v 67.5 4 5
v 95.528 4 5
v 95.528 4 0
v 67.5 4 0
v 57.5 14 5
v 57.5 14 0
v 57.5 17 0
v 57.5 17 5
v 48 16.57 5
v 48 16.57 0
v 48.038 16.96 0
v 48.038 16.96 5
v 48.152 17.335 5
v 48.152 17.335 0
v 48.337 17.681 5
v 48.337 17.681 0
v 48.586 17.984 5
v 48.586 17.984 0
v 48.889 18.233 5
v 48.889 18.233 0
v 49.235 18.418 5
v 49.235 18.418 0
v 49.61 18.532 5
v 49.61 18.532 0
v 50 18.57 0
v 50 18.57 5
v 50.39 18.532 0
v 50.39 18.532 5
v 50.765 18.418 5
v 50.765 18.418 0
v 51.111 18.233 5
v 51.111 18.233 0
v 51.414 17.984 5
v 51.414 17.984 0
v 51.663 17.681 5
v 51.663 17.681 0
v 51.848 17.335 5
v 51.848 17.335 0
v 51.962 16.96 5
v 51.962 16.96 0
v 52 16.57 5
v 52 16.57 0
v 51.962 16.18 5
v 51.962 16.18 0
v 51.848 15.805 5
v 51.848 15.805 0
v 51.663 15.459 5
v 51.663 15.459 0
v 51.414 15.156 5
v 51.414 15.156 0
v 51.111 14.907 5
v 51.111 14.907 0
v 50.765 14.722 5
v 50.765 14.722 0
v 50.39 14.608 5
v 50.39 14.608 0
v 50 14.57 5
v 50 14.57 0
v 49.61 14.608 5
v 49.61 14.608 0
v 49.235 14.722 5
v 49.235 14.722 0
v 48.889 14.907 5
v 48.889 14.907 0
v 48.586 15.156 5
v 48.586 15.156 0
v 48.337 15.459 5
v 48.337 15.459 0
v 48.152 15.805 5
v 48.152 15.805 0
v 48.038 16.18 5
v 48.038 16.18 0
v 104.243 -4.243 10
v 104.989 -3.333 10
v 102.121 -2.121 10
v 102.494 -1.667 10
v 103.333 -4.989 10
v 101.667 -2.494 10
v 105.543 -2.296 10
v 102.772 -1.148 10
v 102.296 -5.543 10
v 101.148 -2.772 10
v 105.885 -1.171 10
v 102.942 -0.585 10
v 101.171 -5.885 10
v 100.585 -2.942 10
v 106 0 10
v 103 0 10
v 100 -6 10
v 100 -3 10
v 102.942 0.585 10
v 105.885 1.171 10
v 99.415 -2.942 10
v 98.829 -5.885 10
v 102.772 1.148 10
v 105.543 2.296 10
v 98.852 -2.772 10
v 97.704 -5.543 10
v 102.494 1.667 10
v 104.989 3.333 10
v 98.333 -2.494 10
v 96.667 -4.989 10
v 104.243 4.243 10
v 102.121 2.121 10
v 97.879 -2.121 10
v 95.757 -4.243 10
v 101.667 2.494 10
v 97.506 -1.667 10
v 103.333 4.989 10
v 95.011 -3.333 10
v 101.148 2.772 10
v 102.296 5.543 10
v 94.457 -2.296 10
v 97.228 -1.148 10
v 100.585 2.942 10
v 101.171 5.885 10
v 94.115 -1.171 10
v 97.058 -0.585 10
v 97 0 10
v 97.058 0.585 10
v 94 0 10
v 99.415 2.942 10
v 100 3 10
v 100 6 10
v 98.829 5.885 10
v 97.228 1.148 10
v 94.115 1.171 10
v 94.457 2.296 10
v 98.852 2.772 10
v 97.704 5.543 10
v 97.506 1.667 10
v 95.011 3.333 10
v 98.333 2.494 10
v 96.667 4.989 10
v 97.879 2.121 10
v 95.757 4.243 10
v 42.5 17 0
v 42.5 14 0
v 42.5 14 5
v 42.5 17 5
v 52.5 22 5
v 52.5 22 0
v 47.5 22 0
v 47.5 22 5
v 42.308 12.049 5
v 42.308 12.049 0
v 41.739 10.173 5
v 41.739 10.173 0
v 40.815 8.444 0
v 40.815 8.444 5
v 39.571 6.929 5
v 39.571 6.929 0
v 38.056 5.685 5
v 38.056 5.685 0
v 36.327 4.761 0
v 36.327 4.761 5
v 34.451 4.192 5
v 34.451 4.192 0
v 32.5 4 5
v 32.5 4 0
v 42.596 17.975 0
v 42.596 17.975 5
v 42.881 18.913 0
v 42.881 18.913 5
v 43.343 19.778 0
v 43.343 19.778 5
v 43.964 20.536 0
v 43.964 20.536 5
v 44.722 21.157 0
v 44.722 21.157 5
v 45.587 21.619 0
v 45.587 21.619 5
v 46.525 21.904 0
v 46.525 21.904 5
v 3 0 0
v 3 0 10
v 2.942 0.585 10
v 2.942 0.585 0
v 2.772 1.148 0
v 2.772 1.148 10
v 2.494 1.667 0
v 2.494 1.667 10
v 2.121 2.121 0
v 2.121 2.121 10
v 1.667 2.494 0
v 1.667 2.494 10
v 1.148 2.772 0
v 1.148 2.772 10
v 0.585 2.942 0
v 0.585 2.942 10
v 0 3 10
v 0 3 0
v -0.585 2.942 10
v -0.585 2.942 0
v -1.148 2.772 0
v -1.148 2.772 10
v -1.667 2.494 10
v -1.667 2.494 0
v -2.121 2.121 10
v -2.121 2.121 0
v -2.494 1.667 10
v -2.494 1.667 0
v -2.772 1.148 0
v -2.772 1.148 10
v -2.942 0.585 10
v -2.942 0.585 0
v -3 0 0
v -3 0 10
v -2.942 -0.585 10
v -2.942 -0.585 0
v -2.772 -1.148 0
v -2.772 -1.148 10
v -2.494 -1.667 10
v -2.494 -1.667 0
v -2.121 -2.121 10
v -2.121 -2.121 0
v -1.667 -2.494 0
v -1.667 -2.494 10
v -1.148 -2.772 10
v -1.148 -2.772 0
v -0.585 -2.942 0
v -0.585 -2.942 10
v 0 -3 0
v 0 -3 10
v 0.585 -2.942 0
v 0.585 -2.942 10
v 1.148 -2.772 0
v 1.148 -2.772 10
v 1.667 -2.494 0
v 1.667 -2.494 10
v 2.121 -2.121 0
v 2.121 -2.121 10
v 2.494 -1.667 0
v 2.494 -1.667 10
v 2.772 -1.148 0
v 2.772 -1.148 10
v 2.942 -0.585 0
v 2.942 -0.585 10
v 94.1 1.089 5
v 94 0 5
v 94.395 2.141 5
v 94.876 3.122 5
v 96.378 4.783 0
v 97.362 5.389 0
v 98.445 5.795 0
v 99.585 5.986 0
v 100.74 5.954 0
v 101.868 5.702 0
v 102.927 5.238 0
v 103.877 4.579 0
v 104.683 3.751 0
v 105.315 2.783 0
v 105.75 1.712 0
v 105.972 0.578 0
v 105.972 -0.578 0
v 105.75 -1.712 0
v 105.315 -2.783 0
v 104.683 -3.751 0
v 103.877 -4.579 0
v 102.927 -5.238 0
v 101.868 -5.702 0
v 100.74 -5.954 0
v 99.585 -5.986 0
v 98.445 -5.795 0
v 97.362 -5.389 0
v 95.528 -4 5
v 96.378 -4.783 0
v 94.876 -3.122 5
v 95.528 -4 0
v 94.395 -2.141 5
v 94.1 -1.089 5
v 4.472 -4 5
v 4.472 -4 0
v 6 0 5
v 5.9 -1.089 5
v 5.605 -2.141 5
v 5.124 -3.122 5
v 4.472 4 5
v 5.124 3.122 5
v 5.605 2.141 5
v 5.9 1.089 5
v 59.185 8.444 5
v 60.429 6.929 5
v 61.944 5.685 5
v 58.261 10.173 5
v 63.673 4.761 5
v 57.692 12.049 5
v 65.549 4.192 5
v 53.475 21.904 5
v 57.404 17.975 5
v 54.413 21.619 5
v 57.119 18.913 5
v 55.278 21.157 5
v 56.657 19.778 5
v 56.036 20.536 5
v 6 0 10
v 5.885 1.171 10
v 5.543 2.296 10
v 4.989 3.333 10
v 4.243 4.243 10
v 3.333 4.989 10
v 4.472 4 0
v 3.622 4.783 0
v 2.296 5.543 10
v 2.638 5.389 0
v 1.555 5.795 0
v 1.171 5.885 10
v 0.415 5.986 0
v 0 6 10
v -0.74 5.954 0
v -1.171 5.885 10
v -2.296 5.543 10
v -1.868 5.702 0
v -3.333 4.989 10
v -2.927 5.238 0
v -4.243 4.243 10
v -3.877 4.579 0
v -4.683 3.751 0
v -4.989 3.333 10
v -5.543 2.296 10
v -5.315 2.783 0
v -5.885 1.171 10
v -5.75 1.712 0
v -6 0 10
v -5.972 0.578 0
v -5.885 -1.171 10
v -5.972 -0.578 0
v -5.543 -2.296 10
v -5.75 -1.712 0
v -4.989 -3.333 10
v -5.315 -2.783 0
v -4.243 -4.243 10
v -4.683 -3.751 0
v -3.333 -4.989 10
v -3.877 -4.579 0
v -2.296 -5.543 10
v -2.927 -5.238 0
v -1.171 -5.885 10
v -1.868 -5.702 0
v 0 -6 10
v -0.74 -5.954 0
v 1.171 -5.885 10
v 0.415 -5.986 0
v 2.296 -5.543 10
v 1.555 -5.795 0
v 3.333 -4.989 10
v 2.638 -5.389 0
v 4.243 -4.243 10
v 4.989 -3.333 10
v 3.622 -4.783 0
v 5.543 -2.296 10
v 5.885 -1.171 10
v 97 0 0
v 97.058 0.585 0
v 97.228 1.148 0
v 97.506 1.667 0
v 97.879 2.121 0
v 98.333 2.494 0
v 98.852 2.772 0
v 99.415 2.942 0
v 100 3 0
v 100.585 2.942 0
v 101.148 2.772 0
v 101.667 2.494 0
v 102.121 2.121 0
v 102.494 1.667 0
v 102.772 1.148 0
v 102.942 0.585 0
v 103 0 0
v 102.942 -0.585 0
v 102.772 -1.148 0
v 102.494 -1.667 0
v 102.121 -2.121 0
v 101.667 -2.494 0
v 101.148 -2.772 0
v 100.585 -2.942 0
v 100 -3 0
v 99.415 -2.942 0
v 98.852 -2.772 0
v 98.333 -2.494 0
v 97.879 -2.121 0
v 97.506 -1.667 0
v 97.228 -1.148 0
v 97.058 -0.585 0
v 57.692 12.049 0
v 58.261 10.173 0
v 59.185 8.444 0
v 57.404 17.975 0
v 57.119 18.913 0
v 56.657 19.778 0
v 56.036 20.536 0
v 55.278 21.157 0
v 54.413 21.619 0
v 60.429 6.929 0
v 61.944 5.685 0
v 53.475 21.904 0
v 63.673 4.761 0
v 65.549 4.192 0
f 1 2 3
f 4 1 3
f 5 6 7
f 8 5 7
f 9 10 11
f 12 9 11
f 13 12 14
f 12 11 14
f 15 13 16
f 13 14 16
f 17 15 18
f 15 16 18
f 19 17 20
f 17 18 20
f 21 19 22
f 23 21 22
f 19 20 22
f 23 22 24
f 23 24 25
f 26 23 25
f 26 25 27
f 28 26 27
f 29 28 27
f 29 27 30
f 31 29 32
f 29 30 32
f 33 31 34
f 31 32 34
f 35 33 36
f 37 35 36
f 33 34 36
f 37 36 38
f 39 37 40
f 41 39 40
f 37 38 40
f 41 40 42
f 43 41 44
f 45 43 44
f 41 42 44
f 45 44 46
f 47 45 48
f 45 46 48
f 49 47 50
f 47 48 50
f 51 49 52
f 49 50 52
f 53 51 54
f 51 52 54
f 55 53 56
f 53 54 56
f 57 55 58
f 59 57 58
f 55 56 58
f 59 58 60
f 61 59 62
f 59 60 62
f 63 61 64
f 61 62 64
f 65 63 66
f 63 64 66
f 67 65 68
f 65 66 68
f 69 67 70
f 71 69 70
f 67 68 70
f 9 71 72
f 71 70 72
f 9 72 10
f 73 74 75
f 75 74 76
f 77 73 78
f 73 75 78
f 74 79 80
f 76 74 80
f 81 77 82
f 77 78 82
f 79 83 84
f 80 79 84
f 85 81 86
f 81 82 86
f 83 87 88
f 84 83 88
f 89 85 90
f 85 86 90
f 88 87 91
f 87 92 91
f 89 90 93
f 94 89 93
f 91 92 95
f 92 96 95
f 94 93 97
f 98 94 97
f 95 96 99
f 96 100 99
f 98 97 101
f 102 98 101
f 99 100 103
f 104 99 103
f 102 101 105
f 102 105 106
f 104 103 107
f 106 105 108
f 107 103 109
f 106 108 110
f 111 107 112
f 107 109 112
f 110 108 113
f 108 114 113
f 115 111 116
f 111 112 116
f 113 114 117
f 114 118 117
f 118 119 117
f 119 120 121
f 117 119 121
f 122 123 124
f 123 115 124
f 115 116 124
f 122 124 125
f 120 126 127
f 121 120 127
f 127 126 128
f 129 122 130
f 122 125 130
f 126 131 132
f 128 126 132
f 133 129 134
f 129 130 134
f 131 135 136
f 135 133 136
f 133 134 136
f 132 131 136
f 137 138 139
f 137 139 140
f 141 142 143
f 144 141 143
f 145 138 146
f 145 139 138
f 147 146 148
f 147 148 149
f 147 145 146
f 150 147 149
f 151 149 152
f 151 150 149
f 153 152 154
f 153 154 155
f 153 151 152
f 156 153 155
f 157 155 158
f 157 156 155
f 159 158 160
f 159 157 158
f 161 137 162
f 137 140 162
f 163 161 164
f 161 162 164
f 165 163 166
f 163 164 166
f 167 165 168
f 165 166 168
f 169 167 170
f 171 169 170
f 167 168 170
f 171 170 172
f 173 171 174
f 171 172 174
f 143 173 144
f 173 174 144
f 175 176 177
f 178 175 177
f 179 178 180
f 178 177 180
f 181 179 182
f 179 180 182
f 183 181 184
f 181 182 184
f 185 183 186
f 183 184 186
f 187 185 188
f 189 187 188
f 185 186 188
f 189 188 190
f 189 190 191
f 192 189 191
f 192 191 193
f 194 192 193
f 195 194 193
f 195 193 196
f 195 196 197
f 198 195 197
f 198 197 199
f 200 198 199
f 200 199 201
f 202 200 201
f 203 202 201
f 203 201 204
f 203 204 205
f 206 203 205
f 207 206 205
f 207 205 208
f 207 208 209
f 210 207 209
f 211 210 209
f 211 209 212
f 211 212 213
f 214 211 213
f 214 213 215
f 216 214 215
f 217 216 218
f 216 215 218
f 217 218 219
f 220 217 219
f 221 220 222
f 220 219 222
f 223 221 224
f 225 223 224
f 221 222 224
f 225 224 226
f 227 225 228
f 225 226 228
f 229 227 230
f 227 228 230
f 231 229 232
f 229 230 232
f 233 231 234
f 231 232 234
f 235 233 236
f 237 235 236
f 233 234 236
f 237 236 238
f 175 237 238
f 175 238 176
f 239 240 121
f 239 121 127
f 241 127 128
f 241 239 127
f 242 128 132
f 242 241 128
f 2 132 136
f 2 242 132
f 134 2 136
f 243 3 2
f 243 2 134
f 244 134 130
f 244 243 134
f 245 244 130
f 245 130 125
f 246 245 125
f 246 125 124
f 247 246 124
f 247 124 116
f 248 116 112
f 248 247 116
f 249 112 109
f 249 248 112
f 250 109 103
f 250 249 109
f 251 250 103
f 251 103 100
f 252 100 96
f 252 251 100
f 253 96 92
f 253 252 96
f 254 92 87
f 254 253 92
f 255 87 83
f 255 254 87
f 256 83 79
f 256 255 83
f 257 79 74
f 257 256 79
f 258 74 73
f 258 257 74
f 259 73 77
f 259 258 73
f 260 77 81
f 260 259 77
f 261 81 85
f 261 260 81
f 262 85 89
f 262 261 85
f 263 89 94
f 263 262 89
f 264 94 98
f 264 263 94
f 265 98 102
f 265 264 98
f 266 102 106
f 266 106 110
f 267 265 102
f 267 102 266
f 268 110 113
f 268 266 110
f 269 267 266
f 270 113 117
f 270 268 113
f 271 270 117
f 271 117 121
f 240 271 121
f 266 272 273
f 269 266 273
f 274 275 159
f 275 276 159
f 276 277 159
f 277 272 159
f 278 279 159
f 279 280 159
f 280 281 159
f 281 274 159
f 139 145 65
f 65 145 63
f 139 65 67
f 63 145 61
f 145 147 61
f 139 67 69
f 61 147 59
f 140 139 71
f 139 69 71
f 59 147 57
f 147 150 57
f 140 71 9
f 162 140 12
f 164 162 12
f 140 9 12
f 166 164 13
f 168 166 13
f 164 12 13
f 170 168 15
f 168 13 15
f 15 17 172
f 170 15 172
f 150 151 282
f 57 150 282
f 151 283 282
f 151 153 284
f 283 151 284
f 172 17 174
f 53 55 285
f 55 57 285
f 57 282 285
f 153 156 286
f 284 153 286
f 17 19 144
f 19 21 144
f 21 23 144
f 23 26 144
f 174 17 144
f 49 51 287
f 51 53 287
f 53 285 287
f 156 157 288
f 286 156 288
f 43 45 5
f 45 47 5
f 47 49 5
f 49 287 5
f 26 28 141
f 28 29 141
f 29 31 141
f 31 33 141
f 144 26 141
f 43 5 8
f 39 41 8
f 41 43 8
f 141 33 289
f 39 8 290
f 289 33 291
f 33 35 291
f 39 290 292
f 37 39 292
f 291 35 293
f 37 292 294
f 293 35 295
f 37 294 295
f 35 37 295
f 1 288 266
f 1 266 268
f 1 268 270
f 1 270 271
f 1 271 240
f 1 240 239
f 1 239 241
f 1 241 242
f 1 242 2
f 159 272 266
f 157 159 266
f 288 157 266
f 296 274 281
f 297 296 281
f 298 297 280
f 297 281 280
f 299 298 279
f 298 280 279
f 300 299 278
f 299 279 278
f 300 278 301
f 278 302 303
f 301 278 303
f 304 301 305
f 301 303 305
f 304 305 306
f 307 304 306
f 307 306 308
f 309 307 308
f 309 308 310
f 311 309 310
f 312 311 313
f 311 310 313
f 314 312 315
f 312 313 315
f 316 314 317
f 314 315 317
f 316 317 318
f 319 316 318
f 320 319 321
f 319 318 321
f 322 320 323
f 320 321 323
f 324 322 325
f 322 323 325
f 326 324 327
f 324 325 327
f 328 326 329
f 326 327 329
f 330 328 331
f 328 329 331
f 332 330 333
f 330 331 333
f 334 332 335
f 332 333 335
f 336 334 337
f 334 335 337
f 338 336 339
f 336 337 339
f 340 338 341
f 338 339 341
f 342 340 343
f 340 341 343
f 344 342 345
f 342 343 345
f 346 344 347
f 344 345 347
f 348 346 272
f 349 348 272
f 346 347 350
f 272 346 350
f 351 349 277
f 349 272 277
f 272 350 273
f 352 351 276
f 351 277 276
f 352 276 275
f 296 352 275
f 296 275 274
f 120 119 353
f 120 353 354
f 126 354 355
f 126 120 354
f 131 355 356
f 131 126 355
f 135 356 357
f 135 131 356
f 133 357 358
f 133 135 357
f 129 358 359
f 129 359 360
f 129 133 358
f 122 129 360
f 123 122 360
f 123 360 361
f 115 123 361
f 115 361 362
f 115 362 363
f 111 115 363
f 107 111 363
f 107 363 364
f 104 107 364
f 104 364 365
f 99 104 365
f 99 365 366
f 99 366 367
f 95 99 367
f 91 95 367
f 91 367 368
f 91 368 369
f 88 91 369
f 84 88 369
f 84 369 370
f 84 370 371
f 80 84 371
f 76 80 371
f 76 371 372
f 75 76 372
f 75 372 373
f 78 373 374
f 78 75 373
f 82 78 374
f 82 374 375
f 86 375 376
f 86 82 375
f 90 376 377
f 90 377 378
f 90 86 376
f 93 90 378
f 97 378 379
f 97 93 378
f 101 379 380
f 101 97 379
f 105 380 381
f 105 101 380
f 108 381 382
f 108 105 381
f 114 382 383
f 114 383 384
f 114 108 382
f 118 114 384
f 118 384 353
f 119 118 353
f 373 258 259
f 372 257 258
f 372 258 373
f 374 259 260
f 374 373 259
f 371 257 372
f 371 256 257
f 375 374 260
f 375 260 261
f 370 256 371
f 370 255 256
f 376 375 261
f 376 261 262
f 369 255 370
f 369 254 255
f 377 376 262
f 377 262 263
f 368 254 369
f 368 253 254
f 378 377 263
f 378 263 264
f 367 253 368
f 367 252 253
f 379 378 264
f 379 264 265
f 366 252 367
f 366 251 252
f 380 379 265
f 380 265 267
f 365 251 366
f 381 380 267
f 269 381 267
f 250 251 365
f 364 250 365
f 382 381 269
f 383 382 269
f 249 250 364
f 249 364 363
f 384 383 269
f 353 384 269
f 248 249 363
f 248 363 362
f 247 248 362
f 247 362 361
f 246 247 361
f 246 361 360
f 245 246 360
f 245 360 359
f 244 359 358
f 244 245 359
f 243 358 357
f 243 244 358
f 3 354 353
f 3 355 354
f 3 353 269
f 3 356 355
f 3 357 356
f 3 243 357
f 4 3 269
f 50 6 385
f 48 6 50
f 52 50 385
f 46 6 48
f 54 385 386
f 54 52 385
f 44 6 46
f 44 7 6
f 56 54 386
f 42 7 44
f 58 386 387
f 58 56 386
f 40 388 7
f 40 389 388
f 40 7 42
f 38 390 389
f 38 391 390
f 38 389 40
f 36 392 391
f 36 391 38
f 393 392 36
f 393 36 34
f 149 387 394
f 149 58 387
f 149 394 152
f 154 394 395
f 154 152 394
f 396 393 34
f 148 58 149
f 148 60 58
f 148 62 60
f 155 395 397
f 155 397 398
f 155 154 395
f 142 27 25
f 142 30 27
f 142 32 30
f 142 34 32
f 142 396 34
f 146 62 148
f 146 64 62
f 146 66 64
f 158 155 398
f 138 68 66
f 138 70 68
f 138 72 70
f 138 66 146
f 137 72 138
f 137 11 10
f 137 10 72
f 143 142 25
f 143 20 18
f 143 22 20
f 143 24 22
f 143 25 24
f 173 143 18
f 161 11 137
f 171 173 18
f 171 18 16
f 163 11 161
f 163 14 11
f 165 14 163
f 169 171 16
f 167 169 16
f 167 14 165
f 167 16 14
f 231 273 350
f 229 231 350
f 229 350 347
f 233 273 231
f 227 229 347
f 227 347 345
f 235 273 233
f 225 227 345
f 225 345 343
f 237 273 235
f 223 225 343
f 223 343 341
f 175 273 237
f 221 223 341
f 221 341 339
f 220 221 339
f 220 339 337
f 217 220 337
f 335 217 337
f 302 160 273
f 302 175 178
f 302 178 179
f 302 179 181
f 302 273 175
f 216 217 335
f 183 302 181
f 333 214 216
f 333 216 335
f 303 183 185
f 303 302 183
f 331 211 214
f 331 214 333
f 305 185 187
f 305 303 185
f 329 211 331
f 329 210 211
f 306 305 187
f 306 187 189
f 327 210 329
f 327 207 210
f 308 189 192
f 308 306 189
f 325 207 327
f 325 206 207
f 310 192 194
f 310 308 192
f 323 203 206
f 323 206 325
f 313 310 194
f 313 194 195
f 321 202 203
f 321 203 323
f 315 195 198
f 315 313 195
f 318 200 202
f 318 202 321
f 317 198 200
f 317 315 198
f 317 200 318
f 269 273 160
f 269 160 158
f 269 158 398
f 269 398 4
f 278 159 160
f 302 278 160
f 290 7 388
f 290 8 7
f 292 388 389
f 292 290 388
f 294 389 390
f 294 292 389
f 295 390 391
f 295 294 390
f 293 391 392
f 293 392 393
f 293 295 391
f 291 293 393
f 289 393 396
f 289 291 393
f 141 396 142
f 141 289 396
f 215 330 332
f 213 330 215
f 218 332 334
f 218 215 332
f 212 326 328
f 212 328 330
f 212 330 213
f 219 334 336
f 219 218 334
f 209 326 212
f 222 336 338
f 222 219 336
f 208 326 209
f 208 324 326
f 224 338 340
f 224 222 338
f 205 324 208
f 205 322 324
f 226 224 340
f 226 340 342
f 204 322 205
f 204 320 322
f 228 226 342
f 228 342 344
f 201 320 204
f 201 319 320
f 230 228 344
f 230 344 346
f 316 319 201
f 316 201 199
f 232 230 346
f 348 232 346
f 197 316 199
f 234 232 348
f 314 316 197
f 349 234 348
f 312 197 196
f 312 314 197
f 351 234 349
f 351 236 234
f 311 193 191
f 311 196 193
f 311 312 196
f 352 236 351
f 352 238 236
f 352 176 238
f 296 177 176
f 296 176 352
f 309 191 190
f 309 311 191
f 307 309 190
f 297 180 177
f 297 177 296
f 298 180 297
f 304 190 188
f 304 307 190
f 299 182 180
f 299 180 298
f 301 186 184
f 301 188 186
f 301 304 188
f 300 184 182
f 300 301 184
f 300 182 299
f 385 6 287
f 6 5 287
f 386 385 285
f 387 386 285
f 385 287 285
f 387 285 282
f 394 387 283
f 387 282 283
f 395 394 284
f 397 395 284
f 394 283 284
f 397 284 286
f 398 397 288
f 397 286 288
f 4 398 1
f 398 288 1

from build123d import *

# Parameters (mm, degrees)
SKETCH_1_R          = 6
EXTRUDE_1_DEPTH     = 10
SKETCH_3_W          = 5
SKETCH_3_H          = 8
EXTRUDE_2_DEPTH     = 50
SKETCH_2_R          = 3
CUT_EXTRUDE_1_DEPTH = 30
SKETCH_14_W         = 15
SKETCH_14_H         = 18
EXTRUDE_7_DEPTH     = 5
FILLET_2_R          = 5
FILLET_3_R          = 10
SKETCH_15_R         = 2
CUT_EXTRUDE_4_DEPTH = 5


with BuildPart() as part:
    # 草图1 → 凸台-拉伸1 (new body)
    with BuildSketch(Plane.XY):
        Circle(SKETCH_1_R)
    extrude(amount=EXTRUDE_1_DEPTH)

    # 草图3 → 凸台-拉伸2 (add)
    with BuildSketch(Plane(origin=(0, 0, 0), x_dir=(0, 0, -1), z_dir=(1, 0, 0))):
        with Locations((-2.5, 0)):
            Rectangle(SKETCH_3_W, SKETCH_3_H)
    extrude(amount=EXTRUDE_2_DEPTH)

    # 草图2 → 切除-拉伸1 (cut)
    with BuildSketch(Plane.XY.offset(10)):
        Circle(SKETCH_2_R)
    extrude(amount=-CUT_EXTRUDE_1_DEPTH, mode=Mode.SUBTRACT)

    # 镜向1: part across plane


with BuildPart() as part_1:
    add(part.part)
    add(part.part.mirror(Plane.ZY.offset(-50)))

    # 草图14 → 凸台-拉伸7 (add)
    with BuildSketch(Plane(origin=(0, 0, 0), x_dir=(-1, 0, 0), z_dir=(0, 0, -1))):
        with Locations((-50, 13)):
            Rectangle(SKETCH_14_W, SKETCH_14_H)
    extrude(amount=-EXTRUDE_7_DEPTH)

    # 圆角2
    fillet_2_edges = [part_1.edges().sort_by_distance(p)[0] for p in [
        (57.5, 22, 2.5),
        (42.5, 22, 2.5),
    ]]
    fillet(fillet_2_edges, radius=FILLET_2_R)

    # 圆角3
    fillet_3_edges = [part_1.edges().sort_by_distance(p)[0] for p in [
        (42.5, 4, 2.5),
        (57.5, 4, 2.5),
    ]]
    fillet(fillet_3_edges, radius=FILLET_3_R)

    # 草图15 → 切除-拉伸4 (cut)
    with BuildSketch(Plane(origin=(0, 0, 0), x_dir=(-1, 0, 0), z_dir=(0, 0, -1))):
        with Locations((-50, 16.57)):
            Circle(SKETCH_15_R)
    extrude(amount=-CUT_EXTRUDE_4_DEPTH, mode=Mode.SUBTRACT)


solid = part_1.part
